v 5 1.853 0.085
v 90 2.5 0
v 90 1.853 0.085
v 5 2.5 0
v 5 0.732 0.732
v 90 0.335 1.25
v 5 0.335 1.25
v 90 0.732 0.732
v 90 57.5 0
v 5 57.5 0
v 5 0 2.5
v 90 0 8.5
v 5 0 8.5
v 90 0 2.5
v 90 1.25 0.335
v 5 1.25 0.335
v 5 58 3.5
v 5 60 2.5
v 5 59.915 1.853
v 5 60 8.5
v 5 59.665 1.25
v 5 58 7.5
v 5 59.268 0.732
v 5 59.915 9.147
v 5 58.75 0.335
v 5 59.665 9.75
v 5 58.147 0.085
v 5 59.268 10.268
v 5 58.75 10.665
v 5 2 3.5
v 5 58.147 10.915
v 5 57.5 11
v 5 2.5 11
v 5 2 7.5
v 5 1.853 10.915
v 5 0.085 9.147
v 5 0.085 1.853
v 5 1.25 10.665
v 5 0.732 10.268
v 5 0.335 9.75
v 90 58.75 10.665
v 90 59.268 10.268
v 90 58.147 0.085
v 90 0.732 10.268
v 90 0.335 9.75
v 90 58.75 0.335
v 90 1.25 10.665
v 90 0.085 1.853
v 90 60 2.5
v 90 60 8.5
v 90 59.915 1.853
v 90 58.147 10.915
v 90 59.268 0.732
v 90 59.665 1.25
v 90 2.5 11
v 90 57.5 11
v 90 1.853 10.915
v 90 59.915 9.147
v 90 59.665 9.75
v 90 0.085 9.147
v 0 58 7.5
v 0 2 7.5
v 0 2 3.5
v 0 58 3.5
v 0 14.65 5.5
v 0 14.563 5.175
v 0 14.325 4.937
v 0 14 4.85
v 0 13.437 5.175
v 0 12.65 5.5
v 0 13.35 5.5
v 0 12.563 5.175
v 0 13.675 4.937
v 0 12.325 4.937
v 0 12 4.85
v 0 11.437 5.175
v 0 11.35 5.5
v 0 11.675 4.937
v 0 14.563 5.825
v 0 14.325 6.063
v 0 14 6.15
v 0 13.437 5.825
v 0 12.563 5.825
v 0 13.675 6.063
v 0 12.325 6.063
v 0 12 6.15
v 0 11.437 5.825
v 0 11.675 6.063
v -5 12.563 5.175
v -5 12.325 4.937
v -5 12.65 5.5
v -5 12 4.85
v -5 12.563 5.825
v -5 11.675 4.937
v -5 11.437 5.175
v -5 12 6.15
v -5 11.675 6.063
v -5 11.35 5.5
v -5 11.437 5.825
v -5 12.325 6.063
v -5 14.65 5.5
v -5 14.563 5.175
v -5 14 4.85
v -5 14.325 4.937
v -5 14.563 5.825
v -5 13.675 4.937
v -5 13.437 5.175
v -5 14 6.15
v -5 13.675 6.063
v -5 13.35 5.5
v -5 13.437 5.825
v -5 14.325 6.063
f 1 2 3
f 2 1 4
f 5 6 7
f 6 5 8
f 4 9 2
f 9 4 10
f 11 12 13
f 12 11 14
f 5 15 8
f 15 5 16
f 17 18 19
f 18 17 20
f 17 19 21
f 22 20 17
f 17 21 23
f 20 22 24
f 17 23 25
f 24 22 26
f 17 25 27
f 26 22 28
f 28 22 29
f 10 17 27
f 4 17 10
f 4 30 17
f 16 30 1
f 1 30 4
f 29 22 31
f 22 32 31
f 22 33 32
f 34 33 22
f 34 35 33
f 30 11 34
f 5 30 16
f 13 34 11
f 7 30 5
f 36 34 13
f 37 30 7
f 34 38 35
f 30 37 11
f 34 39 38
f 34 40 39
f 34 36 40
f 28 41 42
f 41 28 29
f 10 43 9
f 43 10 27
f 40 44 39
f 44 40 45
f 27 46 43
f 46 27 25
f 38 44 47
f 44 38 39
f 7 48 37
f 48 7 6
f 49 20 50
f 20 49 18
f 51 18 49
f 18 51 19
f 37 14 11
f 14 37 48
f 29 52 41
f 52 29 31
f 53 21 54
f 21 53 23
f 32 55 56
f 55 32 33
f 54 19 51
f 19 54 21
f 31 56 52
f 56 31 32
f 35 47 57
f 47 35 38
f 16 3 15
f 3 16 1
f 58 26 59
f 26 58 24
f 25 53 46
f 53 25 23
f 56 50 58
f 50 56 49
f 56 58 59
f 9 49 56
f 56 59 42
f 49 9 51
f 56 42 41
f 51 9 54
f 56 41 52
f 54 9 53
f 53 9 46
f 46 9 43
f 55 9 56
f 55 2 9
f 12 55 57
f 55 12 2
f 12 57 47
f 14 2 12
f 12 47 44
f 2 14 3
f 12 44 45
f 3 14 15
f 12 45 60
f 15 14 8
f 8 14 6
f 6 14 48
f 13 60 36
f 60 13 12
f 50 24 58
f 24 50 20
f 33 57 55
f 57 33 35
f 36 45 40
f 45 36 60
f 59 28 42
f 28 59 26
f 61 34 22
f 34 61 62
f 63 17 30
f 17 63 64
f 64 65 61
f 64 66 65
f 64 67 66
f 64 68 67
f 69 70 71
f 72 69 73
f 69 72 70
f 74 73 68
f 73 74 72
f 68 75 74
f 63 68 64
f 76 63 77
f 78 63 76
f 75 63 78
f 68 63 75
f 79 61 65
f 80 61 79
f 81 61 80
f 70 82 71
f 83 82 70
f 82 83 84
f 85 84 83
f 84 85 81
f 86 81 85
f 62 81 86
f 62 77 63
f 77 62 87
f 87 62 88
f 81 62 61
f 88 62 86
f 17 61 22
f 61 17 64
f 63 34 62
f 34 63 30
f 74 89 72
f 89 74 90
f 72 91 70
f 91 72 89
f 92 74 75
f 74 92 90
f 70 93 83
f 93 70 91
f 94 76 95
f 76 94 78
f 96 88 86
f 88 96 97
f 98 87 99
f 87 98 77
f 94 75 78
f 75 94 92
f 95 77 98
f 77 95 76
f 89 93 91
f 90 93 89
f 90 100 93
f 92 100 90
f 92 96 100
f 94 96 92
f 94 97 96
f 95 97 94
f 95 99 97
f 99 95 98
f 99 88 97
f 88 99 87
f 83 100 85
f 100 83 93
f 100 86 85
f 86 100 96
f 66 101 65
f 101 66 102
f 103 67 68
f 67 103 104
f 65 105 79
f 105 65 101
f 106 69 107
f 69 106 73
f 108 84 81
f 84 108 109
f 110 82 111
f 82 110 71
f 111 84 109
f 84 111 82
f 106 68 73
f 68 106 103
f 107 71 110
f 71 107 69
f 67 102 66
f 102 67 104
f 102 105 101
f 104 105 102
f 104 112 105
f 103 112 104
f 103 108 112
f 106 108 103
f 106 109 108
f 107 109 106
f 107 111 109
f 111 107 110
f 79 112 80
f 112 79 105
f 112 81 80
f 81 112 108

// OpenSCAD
// Reference model of the LiPo cell, for checking the fit in the case.
// Not a printed part. Size as given by the operator: "approximately"
// 90 x 60 x 11 mm; measure the real cell, including its protection board
// and the swelling allowance below, before printing.
//
// Origin: the cell's corner at the lead end; X along its length, Y across,
// Z through its thickness.
bat_l = 90;            // overall length, including the protection board strip
bat_w = 60;
bat_t = 11;
bat_pcm_l = 5;         // strip at the lead end holding the protection board
bat_lead_len = 5;      // leads, drawn straight and cut short
bat_lead_y = 12;       // where the leads leave the cell, from its corner
bat_swell = 0.5;       // a pouch cell may grow about this much in thickness with age

module battery(swollen = false) {
    t = bat_t + (swollen ? bat_swell : 0);
    r = min(2.5, t / 2 - 0.1);
    // Pouch: soft rounded long edges.
    color("silver") translate([bat_pcm_l, 0, 0]) hull() {
        for (y = [r, bat_w - r], z = [r, t - r])
            translate([0, y, z]) rotate([0, 90, 0]) cylinder(r = r, h = bat_l - bat_pcm_l, $fn = 24);
    }
    // Protection board under tape: thinner than the pouch.
    color("gold") translate([0, 2, t / 2 - 2]) cube([bat_pcm_l, bat_w - 4, 4]);
    // Leads.
    color("red") translate([-bat_lead_len, bat_lead_y, t / 2]) rotate([0, 90, 0]) cylinder(d = 1.3, h = bat_lead_len, $fn = 12);
    color("black") translate([-bat_lead_len, bat_lead_y + 2, t / 2]) rotate([0, 90, 0]) cylinder(d = 1.3, h = bat_lead_len, $fn = 12);
}

// Shown when this file is opened by itself; the case switches it off.
battery_demo = true;
if (battery_demo) battery();
